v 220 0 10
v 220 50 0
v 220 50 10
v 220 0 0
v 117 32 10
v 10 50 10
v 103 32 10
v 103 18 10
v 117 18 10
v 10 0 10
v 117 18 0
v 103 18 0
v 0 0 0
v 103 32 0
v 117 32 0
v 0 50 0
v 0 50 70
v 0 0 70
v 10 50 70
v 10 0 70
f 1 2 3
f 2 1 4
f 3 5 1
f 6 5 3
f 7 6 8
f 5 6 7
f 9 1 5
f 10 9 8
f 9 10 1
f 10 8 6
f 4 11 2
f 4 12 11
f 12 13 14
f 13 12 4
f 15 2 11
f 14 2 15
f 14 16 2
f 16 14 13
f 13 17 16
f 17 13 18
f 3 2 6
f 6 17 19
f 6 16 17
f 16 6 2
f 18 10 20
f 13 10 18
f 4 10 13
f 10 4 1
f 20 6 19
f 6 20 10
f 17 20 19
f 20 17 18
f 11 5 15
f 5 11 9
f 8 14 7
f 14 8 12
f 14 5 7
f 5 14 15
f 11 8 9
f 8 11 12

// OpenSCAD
$fn = 32;

// ----------------------------------------------------------------------
// Gantry bracket: 200-250 mm L bracket
// ----------------------------------------------------------------------

// --- parameters (mm) ---
base_l = 220;             // base arm length, X
arm_w = 50;               // arm width, Y
thick = 10;               // arm thickness
up_h = 60;                // vertical arm height, Z
slot_w = 14;              // adjustment slot width in the base

total_h = up_h + thick;  // overall height

difference() {
  union() {
    cube([base_l, arm_w, thick]);
    cube([thick, arm_w, total_h]);
  }
  translate([base_l / 2 - slot_w / 2, arm_w / 2 - slot_w / 2, -1])
    cube([slot_w, slot_w, thick + 2]);
}
